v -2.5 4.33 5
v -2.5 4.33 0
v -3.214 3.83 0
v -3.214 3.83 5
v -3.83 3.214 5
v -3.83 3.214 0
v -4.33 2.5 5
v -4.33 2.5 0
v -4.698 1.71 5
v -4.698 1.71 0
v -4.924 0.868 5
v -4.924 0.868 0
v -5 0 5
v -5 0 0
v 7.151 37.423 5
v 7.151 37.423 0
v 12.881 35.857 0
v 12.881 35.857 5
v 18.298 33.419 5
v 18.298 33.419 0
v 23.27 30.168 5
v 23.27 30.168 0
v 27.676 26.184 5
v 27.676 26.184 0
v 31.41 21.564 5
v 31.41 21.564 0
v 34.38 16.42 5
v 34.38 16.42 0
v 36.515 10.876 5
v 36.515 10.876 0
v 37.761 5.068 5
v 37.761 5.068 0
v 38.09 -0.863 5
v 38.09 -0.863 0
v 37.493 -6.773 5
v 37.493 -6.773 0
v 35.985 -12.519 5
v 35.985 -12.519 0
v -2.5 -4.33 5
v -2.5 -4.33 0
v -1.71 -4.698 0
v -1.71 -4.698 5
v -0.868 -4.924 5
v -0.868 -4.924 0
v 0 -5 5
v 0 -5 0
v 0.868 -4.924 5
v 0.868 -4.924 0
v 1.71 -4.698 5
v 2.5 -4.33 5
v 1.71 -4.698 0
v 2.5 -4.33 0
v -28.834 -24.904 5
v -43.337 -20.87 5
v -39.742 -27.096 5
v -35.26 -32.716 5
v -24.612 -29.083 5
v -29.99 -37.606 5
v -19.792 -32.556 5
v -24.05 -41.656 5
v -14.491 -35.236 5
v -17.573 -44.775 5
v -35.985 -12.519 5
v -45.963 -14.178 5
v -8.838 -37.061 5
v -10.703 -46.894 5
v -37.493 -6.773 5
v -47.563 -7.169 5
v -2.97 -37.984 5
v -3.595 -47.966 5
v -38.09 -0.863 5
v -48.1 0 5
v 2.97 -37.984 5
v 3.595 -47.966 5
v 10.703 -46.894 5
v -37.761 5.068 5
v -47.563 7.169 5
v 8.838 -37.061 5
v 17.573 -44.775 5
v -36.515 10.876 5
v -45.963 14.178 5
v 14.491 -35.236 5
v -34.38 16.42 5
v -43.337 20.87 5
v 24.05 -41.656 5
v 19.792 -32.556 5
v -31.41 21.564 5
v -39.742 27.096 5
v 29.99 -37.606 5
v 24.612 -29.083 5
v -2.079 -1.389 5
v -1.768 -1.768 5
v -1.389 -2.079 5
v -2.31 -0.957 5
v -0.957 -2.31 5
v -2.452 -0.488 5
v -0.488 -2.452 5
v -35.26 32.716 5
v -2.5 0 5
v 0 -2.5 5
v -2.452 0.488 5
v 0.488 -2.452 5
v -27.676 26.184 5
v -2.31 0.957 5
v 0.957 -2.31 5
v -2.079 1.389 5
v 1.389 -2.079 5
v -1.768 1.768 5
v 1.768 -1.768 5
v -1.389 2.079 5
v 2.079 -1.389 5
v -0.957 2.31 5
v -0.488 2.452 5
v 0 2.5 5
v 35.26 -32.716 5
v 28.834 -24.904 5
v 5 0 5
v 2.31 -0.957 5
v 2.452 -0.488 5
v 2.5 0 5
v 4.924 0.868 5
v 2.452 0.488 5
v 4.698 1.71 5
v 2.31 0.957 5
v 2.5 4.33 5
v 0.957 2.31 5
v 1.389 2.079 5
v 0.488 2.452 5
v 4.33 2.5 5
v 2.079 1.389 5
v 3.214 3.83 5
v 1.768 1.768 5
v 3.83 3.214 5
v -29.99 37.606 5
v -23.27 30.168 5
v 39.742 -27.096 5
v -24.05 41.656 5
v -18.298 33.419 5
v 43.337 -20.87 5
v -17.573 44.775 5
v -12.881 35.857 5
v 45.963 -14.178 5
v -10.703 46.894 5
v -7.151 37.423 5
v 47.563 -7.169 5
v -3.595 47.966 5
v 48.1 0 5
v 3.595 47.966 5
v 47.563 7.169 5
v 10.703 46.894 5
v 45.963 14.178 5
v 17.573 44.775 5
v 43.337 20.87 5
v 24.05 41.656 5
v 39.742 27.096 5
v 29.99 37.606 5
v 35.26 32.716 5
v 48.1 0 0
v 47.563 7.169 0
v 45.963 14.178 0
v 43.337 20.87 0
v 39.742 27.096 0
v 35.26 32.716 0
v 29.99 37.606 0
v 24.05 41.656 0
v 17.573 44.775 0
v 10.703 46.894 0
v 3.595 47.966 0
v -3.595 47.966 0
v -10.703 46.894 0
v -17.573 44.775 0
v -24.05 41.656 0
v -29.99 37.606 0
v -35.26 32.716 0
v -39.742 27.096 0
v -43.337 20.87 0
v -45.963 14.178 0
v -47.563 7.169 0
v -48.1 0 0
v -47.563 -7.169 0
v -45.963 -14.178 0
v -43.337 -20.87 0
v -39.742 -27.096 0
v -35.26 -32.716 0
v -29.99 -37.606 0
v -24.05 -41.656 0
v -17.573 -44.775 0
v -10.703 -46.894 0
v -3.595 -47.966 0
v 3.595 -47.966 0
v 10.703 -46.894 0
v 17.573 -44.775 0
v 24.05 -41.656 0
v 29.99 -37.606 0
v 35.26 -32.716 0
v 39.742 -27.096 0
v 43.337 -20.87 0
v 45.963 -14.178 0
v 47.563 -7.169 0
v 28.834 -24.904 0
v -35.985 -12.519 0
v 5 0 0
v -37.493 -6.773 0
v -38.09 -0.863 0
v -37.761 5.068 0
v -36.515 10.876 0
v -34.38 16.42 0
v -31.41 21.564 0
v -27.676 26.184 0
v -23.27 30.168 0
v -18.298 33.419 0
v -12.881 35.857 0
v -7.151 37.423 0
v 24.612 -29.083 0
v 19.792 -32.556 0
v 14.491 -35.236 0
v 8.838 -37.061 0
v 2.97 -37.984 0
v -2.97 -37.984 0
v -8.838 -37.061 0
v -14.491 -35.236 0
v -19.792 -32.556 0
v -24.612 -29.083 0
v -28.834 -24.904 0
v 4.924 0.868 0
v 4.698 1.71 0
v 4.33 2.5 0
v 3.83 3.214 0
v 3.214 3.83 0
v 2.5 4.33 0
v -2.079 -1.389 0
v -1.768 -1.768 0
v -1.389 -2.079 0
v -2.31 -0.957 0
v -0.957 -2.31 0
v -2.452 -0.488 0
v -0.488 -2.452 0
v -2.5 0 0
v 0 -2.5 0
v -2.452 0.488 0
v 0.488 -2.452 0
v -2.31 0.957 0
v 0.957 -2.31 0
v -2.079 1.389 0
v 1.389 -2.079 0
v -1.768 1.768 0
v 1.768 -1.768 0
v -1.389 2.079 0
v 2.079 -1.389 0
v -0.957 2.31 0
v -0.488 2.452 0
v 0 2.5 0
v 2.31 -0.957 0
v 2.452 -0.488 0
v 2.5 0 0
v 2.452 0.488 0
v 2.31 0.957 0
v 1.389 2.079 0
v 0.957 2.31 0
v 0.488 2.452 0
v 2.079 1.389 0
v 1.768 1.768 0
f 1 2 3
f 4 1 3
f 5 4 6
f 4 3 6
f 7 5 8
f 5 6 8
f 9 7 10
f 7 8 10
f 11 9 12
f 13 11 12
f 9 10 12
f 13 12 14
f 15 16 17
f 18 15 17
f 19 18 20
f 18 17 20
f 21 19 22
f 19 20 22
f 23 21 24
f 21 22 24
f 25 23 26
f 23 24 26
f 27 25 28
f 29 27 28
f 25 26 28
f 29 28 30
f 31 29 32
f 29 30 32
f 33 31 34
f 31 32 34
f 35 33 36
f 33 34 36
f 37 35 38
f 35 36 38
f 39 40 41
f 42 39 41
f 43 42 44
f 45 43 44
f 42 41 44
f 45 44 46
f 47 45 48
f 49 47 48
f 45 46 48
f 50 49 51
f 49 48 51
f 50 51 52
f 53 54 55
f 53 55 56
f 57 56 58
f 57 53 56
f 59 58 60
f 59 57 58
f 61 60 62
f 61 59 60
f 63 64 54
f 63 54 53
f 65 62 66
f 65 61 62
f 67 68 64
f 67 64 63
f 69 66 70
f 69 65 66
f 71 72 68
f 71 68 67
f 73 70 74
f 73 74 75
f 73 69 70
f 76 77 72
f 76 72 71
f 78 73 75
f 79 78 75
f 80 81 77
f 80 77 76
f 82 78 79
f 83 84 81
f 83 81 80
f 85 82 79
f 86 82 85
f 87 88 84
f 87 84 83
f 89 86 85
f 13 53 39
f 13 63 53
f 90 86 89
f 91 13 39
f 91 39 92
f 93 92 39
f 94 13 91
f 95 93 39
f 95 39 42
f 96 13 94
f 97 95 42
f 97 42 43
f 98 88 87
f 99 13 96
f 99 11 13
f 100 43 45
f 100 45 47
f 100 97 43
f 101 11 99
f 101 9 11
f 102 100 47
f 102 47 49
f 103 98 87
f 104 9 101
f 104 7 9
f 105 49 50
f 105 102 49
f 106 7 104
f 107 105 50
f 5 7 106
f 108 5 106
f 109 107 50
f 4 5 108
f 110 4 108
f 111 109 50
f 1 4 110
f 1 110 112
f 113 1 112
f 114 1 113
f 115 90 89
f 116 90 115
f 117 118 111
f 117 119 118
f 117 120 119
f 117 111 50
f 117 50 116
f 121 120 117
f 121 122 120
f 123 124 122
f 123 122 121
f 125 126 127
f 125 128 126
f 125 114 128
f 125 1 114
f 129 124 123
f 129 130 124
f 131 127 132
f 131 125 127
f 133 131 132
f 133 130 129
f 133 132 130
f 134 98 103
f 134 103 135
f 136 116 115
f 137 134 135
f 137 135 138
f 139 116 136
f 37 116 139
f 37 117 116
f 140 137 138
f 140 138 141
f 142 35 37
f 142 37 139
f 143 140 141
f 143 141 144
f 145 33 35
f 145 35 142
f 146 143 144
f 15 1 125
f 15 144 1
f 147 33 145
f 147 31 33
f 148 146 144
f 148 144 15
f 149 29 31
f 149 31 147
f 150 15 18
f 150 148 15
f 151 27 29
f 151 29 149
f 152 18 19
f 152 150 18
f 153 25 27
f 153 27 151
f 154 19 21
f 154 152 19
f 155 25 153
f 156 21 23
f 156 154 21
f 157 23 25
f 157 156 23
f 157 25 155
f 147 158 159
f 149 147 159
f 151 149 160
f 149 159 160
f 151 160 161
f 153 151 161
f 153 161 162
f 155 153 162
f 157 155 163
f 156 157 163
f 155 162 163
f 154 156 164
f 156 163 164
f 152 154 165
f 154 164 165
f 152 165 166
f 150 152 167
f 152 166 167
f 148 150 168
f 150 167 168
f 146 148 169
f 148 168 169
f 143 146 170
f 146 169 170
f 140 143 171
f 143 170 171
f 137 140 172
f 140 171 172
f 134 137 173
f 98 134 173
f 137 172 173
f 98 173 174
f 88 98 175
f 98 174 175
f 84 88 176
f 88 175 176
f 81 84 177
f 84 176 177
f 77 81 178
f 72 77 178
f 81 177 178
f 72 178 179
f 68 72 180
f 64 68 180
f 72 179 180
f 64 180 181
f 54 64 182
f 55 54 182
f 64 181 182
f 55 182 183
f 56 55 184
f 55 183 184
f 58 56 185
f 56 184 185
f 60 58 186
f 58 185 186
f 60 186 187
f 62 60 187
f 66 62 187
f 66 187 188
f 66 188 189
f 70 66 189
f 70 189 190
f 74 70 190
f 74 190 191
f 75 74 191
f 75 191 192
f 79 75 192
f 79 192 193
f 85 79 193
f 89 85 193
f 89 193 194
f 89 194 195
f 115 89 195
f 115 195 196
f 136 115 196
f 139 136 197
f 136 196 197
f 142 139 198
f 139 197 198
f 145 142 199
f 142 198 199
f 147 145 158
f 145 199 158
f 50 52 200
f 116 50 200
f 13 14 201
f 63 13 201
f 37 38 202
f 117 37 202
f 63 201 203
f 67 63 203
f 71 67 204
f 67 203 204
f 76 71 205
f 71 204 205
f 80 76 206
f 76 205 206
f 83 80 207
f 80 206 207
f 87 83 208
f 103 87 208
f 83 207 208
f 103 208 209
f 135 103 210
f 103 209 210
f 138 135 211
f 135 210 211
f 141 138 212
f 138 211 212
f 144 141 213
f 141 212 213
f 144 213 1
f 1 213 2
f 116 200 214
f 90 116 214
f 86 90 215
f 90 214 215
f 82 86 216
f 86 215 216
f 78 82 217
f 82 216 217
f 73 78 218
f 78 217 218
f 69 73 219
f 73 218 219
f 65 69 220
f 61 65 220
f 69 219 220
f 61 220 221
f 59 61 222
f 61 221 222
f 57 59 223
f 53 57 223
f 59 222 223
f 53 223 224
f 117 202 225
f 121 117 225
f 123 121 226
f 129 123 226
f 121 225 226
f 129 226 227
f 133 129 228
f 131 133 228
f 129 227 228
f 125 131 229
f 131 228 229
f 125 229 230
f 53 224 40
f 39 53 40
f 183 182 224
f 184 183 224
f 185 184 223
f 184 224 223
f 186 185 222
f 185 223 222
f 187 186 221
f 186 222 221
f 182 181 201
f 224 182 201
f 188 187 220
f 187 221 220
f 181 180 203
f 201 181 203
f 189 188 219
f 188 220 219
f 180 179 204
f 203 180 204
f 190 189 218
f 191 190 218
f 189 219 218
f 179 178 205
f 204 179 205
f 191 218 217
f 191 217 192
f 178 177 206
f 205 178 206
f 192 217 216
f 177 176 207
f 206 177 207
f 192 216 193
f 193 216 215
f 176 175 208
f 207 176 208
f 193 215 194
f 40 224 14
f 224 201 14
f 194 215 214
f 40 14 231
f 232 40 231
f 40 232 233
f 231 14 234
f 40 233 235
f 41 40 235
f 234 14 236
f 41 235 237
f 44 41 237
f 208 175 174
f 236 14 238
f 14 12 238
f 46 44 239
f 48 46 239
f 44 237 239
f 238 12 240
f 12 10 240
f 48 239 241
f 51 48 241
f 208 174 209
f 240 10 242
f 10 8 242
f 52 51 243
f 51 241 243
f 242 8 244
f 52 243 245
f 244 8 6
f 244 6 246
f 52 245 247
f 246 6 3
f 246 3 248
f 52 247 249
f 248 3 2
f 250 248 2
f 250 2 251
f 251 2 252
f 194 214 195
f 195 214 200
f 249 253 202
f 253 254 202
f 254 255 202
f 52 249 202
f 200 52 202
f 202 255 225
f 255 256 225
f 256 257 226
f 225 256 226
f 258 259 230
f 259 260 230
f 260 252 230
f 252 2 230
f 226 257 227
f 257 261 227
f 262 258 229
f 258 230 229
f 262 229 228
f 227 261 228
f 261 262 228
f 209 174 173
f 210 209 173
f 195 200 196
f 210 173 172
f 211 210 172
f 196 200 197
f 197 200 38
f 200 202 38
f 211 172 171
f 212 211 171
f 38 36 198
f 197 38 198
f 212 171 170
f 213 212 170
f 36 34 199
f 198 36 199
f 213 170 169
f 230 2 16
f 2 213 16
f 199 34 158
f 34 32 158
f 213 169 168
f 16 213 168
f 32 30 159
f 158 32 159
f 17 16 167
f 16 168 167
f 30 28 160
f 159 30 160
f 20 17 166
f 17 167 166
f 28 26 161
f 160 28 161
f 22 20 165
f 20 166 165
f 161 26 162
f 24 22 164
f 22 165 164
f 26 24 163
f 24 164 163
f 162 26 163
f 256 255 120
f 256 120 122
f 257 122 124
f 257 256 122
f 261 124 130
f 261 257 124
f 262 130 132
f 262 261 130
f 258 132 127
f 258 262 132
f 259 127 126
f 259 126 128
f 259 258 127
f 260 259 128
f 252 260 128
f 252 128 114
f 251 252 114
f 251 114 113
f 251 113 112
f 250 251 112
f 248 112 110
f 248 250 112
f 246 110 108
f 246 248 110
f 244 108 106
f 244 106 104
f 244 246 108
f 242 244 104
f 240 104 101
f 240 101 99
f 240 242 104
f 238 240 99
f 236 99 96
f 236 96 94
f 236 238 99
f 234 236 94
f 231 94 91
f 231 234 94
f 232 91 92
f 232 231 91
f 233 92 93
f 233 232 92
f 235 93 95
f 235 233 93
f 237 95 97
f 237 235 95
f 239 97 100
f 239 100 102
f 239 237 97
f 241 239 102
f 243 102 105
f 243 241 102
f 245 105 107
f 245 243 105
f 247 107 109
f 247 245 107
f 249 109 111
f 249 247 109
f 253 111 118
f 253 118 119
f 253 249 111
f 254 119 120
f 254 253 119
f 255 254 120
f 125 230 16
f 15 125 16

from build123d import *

# Parameters (mm, degrees)
SKETCH1_R           = 48.1
SKETCH1_R_2         = 2.5
BOSS_EXTRUDE1_DEPTH = 5


with BuildPart() as part:
    # Sketch1 → Boss-Extrude1 (new body)
    with BuildSketch(Plane.XY):
        Circle(SKETCH1_R)
        with BuildLine():
            Line((-7.150888472, 37.422918032), (-2.5, 4.330127019))
            ThreePointArc((-2.5, 4.330127019), (-4.330127019, 2.5), (-5, 0))
            Line((-5, 0), (-35.984641936, -12.51860794))
            ThreePointArc((-35.984641936, -12.51860794), (-32.995567884, 19.05), (-7.150888472, 37.422918032))
        make_face(mode=Mode.SUBTRACT)
        with BuildLine():
            Line((-28.833753464, -24.904310092), (-2.5, -4.330127019))
            ThreePointArc((-2.5, -4.330127019), (0, -5), (2.5, -4.330127019))
            Line((2.5, -4.330127019), (28.833753464, -24.904310092))
            ThreePointArc((28.833753464, -24.904310092), (0, -38.1), (-28.833753464, -24.904310092))
        make_face(mode=Mode.SUBTRACT)
        with BuildLine():
            Line((35.984641936, -12.51860794), (5, 0))
            ThreePointArc((5, 0), (4.330127019, 2.5), (2.5, 4.330127019))
            Line((2.5, 4.330127019), (7.150888472, 37.422918032))
            ThreePointArc((7.150888472, 37.422918032), (32.995567884, 19.05), (35.984641936, -12.51860794))
        make_face(mode=Mode.SUBTRACT)
        Circle(SKETCH1_R_2, mode=Mode.SUBTRACT)
    extrude(amount=BOSS_EXTRUDE1_DEPTH)


solid = part.part
